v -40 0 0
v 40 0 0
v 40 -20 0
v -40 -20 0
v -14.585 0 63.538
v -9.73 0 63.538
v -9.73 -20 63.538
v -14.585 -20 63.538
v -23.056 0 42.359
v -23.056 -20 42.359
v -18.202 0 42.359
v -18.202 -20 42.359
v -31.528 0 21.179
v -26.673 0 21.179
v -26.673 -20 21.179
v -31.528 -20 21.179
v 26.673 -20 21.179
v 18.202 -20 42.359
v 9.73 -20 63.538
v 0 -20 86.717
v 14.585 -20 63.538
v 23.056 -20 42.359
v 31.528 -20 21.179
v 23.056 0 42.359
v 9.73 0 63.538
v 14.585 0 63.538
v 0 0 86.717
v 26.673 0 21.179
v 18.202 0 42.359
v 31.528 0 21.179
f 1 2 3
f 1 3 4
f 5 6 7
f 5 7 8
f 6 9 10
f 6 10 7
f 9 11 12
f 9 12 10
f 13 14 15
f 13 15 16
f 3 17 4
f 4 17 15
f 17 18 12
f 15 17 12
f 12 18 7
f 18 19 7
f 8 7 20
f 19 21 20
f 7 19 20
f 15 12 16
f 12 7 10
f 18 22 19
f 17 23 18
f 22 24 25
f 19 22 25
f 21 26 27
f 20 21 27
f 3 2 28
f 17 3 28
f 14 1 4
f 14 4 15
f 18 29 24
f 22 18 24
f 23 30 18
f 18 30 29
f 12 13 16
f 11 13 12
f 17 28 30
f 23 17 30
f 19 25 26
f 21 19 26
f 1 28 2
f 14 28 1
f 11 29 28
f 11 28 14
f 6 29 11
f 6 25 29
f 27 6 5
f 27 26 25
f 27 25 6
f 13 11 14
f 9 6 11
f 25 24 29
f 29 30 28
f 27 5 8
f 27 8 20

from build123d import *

# Parameters (mm, degrees)
F1_DEPTH = 20


with BuildPart() as f1:
    # F0 (on Front) → F1 (new body)
    with BuildSketch(Plane.XZ):
        Polygon((0, 86.717134), (0, 0), (40, 0), (26.673388, 21.179436), (31.528226, 21.179436), (18.201613, 42.358872), (23.056451, 42.358872), (9.729839, 63.538307), (14.584677, 63.538307), align=None)
    extrude(amount=F1_DEPTH)

    # F2: F1 across plane


with BuildPart() as f1_1:
    add(f1.part)
    add(f1.part.mirror(Plane.YZ))


solid = f1_1.part
